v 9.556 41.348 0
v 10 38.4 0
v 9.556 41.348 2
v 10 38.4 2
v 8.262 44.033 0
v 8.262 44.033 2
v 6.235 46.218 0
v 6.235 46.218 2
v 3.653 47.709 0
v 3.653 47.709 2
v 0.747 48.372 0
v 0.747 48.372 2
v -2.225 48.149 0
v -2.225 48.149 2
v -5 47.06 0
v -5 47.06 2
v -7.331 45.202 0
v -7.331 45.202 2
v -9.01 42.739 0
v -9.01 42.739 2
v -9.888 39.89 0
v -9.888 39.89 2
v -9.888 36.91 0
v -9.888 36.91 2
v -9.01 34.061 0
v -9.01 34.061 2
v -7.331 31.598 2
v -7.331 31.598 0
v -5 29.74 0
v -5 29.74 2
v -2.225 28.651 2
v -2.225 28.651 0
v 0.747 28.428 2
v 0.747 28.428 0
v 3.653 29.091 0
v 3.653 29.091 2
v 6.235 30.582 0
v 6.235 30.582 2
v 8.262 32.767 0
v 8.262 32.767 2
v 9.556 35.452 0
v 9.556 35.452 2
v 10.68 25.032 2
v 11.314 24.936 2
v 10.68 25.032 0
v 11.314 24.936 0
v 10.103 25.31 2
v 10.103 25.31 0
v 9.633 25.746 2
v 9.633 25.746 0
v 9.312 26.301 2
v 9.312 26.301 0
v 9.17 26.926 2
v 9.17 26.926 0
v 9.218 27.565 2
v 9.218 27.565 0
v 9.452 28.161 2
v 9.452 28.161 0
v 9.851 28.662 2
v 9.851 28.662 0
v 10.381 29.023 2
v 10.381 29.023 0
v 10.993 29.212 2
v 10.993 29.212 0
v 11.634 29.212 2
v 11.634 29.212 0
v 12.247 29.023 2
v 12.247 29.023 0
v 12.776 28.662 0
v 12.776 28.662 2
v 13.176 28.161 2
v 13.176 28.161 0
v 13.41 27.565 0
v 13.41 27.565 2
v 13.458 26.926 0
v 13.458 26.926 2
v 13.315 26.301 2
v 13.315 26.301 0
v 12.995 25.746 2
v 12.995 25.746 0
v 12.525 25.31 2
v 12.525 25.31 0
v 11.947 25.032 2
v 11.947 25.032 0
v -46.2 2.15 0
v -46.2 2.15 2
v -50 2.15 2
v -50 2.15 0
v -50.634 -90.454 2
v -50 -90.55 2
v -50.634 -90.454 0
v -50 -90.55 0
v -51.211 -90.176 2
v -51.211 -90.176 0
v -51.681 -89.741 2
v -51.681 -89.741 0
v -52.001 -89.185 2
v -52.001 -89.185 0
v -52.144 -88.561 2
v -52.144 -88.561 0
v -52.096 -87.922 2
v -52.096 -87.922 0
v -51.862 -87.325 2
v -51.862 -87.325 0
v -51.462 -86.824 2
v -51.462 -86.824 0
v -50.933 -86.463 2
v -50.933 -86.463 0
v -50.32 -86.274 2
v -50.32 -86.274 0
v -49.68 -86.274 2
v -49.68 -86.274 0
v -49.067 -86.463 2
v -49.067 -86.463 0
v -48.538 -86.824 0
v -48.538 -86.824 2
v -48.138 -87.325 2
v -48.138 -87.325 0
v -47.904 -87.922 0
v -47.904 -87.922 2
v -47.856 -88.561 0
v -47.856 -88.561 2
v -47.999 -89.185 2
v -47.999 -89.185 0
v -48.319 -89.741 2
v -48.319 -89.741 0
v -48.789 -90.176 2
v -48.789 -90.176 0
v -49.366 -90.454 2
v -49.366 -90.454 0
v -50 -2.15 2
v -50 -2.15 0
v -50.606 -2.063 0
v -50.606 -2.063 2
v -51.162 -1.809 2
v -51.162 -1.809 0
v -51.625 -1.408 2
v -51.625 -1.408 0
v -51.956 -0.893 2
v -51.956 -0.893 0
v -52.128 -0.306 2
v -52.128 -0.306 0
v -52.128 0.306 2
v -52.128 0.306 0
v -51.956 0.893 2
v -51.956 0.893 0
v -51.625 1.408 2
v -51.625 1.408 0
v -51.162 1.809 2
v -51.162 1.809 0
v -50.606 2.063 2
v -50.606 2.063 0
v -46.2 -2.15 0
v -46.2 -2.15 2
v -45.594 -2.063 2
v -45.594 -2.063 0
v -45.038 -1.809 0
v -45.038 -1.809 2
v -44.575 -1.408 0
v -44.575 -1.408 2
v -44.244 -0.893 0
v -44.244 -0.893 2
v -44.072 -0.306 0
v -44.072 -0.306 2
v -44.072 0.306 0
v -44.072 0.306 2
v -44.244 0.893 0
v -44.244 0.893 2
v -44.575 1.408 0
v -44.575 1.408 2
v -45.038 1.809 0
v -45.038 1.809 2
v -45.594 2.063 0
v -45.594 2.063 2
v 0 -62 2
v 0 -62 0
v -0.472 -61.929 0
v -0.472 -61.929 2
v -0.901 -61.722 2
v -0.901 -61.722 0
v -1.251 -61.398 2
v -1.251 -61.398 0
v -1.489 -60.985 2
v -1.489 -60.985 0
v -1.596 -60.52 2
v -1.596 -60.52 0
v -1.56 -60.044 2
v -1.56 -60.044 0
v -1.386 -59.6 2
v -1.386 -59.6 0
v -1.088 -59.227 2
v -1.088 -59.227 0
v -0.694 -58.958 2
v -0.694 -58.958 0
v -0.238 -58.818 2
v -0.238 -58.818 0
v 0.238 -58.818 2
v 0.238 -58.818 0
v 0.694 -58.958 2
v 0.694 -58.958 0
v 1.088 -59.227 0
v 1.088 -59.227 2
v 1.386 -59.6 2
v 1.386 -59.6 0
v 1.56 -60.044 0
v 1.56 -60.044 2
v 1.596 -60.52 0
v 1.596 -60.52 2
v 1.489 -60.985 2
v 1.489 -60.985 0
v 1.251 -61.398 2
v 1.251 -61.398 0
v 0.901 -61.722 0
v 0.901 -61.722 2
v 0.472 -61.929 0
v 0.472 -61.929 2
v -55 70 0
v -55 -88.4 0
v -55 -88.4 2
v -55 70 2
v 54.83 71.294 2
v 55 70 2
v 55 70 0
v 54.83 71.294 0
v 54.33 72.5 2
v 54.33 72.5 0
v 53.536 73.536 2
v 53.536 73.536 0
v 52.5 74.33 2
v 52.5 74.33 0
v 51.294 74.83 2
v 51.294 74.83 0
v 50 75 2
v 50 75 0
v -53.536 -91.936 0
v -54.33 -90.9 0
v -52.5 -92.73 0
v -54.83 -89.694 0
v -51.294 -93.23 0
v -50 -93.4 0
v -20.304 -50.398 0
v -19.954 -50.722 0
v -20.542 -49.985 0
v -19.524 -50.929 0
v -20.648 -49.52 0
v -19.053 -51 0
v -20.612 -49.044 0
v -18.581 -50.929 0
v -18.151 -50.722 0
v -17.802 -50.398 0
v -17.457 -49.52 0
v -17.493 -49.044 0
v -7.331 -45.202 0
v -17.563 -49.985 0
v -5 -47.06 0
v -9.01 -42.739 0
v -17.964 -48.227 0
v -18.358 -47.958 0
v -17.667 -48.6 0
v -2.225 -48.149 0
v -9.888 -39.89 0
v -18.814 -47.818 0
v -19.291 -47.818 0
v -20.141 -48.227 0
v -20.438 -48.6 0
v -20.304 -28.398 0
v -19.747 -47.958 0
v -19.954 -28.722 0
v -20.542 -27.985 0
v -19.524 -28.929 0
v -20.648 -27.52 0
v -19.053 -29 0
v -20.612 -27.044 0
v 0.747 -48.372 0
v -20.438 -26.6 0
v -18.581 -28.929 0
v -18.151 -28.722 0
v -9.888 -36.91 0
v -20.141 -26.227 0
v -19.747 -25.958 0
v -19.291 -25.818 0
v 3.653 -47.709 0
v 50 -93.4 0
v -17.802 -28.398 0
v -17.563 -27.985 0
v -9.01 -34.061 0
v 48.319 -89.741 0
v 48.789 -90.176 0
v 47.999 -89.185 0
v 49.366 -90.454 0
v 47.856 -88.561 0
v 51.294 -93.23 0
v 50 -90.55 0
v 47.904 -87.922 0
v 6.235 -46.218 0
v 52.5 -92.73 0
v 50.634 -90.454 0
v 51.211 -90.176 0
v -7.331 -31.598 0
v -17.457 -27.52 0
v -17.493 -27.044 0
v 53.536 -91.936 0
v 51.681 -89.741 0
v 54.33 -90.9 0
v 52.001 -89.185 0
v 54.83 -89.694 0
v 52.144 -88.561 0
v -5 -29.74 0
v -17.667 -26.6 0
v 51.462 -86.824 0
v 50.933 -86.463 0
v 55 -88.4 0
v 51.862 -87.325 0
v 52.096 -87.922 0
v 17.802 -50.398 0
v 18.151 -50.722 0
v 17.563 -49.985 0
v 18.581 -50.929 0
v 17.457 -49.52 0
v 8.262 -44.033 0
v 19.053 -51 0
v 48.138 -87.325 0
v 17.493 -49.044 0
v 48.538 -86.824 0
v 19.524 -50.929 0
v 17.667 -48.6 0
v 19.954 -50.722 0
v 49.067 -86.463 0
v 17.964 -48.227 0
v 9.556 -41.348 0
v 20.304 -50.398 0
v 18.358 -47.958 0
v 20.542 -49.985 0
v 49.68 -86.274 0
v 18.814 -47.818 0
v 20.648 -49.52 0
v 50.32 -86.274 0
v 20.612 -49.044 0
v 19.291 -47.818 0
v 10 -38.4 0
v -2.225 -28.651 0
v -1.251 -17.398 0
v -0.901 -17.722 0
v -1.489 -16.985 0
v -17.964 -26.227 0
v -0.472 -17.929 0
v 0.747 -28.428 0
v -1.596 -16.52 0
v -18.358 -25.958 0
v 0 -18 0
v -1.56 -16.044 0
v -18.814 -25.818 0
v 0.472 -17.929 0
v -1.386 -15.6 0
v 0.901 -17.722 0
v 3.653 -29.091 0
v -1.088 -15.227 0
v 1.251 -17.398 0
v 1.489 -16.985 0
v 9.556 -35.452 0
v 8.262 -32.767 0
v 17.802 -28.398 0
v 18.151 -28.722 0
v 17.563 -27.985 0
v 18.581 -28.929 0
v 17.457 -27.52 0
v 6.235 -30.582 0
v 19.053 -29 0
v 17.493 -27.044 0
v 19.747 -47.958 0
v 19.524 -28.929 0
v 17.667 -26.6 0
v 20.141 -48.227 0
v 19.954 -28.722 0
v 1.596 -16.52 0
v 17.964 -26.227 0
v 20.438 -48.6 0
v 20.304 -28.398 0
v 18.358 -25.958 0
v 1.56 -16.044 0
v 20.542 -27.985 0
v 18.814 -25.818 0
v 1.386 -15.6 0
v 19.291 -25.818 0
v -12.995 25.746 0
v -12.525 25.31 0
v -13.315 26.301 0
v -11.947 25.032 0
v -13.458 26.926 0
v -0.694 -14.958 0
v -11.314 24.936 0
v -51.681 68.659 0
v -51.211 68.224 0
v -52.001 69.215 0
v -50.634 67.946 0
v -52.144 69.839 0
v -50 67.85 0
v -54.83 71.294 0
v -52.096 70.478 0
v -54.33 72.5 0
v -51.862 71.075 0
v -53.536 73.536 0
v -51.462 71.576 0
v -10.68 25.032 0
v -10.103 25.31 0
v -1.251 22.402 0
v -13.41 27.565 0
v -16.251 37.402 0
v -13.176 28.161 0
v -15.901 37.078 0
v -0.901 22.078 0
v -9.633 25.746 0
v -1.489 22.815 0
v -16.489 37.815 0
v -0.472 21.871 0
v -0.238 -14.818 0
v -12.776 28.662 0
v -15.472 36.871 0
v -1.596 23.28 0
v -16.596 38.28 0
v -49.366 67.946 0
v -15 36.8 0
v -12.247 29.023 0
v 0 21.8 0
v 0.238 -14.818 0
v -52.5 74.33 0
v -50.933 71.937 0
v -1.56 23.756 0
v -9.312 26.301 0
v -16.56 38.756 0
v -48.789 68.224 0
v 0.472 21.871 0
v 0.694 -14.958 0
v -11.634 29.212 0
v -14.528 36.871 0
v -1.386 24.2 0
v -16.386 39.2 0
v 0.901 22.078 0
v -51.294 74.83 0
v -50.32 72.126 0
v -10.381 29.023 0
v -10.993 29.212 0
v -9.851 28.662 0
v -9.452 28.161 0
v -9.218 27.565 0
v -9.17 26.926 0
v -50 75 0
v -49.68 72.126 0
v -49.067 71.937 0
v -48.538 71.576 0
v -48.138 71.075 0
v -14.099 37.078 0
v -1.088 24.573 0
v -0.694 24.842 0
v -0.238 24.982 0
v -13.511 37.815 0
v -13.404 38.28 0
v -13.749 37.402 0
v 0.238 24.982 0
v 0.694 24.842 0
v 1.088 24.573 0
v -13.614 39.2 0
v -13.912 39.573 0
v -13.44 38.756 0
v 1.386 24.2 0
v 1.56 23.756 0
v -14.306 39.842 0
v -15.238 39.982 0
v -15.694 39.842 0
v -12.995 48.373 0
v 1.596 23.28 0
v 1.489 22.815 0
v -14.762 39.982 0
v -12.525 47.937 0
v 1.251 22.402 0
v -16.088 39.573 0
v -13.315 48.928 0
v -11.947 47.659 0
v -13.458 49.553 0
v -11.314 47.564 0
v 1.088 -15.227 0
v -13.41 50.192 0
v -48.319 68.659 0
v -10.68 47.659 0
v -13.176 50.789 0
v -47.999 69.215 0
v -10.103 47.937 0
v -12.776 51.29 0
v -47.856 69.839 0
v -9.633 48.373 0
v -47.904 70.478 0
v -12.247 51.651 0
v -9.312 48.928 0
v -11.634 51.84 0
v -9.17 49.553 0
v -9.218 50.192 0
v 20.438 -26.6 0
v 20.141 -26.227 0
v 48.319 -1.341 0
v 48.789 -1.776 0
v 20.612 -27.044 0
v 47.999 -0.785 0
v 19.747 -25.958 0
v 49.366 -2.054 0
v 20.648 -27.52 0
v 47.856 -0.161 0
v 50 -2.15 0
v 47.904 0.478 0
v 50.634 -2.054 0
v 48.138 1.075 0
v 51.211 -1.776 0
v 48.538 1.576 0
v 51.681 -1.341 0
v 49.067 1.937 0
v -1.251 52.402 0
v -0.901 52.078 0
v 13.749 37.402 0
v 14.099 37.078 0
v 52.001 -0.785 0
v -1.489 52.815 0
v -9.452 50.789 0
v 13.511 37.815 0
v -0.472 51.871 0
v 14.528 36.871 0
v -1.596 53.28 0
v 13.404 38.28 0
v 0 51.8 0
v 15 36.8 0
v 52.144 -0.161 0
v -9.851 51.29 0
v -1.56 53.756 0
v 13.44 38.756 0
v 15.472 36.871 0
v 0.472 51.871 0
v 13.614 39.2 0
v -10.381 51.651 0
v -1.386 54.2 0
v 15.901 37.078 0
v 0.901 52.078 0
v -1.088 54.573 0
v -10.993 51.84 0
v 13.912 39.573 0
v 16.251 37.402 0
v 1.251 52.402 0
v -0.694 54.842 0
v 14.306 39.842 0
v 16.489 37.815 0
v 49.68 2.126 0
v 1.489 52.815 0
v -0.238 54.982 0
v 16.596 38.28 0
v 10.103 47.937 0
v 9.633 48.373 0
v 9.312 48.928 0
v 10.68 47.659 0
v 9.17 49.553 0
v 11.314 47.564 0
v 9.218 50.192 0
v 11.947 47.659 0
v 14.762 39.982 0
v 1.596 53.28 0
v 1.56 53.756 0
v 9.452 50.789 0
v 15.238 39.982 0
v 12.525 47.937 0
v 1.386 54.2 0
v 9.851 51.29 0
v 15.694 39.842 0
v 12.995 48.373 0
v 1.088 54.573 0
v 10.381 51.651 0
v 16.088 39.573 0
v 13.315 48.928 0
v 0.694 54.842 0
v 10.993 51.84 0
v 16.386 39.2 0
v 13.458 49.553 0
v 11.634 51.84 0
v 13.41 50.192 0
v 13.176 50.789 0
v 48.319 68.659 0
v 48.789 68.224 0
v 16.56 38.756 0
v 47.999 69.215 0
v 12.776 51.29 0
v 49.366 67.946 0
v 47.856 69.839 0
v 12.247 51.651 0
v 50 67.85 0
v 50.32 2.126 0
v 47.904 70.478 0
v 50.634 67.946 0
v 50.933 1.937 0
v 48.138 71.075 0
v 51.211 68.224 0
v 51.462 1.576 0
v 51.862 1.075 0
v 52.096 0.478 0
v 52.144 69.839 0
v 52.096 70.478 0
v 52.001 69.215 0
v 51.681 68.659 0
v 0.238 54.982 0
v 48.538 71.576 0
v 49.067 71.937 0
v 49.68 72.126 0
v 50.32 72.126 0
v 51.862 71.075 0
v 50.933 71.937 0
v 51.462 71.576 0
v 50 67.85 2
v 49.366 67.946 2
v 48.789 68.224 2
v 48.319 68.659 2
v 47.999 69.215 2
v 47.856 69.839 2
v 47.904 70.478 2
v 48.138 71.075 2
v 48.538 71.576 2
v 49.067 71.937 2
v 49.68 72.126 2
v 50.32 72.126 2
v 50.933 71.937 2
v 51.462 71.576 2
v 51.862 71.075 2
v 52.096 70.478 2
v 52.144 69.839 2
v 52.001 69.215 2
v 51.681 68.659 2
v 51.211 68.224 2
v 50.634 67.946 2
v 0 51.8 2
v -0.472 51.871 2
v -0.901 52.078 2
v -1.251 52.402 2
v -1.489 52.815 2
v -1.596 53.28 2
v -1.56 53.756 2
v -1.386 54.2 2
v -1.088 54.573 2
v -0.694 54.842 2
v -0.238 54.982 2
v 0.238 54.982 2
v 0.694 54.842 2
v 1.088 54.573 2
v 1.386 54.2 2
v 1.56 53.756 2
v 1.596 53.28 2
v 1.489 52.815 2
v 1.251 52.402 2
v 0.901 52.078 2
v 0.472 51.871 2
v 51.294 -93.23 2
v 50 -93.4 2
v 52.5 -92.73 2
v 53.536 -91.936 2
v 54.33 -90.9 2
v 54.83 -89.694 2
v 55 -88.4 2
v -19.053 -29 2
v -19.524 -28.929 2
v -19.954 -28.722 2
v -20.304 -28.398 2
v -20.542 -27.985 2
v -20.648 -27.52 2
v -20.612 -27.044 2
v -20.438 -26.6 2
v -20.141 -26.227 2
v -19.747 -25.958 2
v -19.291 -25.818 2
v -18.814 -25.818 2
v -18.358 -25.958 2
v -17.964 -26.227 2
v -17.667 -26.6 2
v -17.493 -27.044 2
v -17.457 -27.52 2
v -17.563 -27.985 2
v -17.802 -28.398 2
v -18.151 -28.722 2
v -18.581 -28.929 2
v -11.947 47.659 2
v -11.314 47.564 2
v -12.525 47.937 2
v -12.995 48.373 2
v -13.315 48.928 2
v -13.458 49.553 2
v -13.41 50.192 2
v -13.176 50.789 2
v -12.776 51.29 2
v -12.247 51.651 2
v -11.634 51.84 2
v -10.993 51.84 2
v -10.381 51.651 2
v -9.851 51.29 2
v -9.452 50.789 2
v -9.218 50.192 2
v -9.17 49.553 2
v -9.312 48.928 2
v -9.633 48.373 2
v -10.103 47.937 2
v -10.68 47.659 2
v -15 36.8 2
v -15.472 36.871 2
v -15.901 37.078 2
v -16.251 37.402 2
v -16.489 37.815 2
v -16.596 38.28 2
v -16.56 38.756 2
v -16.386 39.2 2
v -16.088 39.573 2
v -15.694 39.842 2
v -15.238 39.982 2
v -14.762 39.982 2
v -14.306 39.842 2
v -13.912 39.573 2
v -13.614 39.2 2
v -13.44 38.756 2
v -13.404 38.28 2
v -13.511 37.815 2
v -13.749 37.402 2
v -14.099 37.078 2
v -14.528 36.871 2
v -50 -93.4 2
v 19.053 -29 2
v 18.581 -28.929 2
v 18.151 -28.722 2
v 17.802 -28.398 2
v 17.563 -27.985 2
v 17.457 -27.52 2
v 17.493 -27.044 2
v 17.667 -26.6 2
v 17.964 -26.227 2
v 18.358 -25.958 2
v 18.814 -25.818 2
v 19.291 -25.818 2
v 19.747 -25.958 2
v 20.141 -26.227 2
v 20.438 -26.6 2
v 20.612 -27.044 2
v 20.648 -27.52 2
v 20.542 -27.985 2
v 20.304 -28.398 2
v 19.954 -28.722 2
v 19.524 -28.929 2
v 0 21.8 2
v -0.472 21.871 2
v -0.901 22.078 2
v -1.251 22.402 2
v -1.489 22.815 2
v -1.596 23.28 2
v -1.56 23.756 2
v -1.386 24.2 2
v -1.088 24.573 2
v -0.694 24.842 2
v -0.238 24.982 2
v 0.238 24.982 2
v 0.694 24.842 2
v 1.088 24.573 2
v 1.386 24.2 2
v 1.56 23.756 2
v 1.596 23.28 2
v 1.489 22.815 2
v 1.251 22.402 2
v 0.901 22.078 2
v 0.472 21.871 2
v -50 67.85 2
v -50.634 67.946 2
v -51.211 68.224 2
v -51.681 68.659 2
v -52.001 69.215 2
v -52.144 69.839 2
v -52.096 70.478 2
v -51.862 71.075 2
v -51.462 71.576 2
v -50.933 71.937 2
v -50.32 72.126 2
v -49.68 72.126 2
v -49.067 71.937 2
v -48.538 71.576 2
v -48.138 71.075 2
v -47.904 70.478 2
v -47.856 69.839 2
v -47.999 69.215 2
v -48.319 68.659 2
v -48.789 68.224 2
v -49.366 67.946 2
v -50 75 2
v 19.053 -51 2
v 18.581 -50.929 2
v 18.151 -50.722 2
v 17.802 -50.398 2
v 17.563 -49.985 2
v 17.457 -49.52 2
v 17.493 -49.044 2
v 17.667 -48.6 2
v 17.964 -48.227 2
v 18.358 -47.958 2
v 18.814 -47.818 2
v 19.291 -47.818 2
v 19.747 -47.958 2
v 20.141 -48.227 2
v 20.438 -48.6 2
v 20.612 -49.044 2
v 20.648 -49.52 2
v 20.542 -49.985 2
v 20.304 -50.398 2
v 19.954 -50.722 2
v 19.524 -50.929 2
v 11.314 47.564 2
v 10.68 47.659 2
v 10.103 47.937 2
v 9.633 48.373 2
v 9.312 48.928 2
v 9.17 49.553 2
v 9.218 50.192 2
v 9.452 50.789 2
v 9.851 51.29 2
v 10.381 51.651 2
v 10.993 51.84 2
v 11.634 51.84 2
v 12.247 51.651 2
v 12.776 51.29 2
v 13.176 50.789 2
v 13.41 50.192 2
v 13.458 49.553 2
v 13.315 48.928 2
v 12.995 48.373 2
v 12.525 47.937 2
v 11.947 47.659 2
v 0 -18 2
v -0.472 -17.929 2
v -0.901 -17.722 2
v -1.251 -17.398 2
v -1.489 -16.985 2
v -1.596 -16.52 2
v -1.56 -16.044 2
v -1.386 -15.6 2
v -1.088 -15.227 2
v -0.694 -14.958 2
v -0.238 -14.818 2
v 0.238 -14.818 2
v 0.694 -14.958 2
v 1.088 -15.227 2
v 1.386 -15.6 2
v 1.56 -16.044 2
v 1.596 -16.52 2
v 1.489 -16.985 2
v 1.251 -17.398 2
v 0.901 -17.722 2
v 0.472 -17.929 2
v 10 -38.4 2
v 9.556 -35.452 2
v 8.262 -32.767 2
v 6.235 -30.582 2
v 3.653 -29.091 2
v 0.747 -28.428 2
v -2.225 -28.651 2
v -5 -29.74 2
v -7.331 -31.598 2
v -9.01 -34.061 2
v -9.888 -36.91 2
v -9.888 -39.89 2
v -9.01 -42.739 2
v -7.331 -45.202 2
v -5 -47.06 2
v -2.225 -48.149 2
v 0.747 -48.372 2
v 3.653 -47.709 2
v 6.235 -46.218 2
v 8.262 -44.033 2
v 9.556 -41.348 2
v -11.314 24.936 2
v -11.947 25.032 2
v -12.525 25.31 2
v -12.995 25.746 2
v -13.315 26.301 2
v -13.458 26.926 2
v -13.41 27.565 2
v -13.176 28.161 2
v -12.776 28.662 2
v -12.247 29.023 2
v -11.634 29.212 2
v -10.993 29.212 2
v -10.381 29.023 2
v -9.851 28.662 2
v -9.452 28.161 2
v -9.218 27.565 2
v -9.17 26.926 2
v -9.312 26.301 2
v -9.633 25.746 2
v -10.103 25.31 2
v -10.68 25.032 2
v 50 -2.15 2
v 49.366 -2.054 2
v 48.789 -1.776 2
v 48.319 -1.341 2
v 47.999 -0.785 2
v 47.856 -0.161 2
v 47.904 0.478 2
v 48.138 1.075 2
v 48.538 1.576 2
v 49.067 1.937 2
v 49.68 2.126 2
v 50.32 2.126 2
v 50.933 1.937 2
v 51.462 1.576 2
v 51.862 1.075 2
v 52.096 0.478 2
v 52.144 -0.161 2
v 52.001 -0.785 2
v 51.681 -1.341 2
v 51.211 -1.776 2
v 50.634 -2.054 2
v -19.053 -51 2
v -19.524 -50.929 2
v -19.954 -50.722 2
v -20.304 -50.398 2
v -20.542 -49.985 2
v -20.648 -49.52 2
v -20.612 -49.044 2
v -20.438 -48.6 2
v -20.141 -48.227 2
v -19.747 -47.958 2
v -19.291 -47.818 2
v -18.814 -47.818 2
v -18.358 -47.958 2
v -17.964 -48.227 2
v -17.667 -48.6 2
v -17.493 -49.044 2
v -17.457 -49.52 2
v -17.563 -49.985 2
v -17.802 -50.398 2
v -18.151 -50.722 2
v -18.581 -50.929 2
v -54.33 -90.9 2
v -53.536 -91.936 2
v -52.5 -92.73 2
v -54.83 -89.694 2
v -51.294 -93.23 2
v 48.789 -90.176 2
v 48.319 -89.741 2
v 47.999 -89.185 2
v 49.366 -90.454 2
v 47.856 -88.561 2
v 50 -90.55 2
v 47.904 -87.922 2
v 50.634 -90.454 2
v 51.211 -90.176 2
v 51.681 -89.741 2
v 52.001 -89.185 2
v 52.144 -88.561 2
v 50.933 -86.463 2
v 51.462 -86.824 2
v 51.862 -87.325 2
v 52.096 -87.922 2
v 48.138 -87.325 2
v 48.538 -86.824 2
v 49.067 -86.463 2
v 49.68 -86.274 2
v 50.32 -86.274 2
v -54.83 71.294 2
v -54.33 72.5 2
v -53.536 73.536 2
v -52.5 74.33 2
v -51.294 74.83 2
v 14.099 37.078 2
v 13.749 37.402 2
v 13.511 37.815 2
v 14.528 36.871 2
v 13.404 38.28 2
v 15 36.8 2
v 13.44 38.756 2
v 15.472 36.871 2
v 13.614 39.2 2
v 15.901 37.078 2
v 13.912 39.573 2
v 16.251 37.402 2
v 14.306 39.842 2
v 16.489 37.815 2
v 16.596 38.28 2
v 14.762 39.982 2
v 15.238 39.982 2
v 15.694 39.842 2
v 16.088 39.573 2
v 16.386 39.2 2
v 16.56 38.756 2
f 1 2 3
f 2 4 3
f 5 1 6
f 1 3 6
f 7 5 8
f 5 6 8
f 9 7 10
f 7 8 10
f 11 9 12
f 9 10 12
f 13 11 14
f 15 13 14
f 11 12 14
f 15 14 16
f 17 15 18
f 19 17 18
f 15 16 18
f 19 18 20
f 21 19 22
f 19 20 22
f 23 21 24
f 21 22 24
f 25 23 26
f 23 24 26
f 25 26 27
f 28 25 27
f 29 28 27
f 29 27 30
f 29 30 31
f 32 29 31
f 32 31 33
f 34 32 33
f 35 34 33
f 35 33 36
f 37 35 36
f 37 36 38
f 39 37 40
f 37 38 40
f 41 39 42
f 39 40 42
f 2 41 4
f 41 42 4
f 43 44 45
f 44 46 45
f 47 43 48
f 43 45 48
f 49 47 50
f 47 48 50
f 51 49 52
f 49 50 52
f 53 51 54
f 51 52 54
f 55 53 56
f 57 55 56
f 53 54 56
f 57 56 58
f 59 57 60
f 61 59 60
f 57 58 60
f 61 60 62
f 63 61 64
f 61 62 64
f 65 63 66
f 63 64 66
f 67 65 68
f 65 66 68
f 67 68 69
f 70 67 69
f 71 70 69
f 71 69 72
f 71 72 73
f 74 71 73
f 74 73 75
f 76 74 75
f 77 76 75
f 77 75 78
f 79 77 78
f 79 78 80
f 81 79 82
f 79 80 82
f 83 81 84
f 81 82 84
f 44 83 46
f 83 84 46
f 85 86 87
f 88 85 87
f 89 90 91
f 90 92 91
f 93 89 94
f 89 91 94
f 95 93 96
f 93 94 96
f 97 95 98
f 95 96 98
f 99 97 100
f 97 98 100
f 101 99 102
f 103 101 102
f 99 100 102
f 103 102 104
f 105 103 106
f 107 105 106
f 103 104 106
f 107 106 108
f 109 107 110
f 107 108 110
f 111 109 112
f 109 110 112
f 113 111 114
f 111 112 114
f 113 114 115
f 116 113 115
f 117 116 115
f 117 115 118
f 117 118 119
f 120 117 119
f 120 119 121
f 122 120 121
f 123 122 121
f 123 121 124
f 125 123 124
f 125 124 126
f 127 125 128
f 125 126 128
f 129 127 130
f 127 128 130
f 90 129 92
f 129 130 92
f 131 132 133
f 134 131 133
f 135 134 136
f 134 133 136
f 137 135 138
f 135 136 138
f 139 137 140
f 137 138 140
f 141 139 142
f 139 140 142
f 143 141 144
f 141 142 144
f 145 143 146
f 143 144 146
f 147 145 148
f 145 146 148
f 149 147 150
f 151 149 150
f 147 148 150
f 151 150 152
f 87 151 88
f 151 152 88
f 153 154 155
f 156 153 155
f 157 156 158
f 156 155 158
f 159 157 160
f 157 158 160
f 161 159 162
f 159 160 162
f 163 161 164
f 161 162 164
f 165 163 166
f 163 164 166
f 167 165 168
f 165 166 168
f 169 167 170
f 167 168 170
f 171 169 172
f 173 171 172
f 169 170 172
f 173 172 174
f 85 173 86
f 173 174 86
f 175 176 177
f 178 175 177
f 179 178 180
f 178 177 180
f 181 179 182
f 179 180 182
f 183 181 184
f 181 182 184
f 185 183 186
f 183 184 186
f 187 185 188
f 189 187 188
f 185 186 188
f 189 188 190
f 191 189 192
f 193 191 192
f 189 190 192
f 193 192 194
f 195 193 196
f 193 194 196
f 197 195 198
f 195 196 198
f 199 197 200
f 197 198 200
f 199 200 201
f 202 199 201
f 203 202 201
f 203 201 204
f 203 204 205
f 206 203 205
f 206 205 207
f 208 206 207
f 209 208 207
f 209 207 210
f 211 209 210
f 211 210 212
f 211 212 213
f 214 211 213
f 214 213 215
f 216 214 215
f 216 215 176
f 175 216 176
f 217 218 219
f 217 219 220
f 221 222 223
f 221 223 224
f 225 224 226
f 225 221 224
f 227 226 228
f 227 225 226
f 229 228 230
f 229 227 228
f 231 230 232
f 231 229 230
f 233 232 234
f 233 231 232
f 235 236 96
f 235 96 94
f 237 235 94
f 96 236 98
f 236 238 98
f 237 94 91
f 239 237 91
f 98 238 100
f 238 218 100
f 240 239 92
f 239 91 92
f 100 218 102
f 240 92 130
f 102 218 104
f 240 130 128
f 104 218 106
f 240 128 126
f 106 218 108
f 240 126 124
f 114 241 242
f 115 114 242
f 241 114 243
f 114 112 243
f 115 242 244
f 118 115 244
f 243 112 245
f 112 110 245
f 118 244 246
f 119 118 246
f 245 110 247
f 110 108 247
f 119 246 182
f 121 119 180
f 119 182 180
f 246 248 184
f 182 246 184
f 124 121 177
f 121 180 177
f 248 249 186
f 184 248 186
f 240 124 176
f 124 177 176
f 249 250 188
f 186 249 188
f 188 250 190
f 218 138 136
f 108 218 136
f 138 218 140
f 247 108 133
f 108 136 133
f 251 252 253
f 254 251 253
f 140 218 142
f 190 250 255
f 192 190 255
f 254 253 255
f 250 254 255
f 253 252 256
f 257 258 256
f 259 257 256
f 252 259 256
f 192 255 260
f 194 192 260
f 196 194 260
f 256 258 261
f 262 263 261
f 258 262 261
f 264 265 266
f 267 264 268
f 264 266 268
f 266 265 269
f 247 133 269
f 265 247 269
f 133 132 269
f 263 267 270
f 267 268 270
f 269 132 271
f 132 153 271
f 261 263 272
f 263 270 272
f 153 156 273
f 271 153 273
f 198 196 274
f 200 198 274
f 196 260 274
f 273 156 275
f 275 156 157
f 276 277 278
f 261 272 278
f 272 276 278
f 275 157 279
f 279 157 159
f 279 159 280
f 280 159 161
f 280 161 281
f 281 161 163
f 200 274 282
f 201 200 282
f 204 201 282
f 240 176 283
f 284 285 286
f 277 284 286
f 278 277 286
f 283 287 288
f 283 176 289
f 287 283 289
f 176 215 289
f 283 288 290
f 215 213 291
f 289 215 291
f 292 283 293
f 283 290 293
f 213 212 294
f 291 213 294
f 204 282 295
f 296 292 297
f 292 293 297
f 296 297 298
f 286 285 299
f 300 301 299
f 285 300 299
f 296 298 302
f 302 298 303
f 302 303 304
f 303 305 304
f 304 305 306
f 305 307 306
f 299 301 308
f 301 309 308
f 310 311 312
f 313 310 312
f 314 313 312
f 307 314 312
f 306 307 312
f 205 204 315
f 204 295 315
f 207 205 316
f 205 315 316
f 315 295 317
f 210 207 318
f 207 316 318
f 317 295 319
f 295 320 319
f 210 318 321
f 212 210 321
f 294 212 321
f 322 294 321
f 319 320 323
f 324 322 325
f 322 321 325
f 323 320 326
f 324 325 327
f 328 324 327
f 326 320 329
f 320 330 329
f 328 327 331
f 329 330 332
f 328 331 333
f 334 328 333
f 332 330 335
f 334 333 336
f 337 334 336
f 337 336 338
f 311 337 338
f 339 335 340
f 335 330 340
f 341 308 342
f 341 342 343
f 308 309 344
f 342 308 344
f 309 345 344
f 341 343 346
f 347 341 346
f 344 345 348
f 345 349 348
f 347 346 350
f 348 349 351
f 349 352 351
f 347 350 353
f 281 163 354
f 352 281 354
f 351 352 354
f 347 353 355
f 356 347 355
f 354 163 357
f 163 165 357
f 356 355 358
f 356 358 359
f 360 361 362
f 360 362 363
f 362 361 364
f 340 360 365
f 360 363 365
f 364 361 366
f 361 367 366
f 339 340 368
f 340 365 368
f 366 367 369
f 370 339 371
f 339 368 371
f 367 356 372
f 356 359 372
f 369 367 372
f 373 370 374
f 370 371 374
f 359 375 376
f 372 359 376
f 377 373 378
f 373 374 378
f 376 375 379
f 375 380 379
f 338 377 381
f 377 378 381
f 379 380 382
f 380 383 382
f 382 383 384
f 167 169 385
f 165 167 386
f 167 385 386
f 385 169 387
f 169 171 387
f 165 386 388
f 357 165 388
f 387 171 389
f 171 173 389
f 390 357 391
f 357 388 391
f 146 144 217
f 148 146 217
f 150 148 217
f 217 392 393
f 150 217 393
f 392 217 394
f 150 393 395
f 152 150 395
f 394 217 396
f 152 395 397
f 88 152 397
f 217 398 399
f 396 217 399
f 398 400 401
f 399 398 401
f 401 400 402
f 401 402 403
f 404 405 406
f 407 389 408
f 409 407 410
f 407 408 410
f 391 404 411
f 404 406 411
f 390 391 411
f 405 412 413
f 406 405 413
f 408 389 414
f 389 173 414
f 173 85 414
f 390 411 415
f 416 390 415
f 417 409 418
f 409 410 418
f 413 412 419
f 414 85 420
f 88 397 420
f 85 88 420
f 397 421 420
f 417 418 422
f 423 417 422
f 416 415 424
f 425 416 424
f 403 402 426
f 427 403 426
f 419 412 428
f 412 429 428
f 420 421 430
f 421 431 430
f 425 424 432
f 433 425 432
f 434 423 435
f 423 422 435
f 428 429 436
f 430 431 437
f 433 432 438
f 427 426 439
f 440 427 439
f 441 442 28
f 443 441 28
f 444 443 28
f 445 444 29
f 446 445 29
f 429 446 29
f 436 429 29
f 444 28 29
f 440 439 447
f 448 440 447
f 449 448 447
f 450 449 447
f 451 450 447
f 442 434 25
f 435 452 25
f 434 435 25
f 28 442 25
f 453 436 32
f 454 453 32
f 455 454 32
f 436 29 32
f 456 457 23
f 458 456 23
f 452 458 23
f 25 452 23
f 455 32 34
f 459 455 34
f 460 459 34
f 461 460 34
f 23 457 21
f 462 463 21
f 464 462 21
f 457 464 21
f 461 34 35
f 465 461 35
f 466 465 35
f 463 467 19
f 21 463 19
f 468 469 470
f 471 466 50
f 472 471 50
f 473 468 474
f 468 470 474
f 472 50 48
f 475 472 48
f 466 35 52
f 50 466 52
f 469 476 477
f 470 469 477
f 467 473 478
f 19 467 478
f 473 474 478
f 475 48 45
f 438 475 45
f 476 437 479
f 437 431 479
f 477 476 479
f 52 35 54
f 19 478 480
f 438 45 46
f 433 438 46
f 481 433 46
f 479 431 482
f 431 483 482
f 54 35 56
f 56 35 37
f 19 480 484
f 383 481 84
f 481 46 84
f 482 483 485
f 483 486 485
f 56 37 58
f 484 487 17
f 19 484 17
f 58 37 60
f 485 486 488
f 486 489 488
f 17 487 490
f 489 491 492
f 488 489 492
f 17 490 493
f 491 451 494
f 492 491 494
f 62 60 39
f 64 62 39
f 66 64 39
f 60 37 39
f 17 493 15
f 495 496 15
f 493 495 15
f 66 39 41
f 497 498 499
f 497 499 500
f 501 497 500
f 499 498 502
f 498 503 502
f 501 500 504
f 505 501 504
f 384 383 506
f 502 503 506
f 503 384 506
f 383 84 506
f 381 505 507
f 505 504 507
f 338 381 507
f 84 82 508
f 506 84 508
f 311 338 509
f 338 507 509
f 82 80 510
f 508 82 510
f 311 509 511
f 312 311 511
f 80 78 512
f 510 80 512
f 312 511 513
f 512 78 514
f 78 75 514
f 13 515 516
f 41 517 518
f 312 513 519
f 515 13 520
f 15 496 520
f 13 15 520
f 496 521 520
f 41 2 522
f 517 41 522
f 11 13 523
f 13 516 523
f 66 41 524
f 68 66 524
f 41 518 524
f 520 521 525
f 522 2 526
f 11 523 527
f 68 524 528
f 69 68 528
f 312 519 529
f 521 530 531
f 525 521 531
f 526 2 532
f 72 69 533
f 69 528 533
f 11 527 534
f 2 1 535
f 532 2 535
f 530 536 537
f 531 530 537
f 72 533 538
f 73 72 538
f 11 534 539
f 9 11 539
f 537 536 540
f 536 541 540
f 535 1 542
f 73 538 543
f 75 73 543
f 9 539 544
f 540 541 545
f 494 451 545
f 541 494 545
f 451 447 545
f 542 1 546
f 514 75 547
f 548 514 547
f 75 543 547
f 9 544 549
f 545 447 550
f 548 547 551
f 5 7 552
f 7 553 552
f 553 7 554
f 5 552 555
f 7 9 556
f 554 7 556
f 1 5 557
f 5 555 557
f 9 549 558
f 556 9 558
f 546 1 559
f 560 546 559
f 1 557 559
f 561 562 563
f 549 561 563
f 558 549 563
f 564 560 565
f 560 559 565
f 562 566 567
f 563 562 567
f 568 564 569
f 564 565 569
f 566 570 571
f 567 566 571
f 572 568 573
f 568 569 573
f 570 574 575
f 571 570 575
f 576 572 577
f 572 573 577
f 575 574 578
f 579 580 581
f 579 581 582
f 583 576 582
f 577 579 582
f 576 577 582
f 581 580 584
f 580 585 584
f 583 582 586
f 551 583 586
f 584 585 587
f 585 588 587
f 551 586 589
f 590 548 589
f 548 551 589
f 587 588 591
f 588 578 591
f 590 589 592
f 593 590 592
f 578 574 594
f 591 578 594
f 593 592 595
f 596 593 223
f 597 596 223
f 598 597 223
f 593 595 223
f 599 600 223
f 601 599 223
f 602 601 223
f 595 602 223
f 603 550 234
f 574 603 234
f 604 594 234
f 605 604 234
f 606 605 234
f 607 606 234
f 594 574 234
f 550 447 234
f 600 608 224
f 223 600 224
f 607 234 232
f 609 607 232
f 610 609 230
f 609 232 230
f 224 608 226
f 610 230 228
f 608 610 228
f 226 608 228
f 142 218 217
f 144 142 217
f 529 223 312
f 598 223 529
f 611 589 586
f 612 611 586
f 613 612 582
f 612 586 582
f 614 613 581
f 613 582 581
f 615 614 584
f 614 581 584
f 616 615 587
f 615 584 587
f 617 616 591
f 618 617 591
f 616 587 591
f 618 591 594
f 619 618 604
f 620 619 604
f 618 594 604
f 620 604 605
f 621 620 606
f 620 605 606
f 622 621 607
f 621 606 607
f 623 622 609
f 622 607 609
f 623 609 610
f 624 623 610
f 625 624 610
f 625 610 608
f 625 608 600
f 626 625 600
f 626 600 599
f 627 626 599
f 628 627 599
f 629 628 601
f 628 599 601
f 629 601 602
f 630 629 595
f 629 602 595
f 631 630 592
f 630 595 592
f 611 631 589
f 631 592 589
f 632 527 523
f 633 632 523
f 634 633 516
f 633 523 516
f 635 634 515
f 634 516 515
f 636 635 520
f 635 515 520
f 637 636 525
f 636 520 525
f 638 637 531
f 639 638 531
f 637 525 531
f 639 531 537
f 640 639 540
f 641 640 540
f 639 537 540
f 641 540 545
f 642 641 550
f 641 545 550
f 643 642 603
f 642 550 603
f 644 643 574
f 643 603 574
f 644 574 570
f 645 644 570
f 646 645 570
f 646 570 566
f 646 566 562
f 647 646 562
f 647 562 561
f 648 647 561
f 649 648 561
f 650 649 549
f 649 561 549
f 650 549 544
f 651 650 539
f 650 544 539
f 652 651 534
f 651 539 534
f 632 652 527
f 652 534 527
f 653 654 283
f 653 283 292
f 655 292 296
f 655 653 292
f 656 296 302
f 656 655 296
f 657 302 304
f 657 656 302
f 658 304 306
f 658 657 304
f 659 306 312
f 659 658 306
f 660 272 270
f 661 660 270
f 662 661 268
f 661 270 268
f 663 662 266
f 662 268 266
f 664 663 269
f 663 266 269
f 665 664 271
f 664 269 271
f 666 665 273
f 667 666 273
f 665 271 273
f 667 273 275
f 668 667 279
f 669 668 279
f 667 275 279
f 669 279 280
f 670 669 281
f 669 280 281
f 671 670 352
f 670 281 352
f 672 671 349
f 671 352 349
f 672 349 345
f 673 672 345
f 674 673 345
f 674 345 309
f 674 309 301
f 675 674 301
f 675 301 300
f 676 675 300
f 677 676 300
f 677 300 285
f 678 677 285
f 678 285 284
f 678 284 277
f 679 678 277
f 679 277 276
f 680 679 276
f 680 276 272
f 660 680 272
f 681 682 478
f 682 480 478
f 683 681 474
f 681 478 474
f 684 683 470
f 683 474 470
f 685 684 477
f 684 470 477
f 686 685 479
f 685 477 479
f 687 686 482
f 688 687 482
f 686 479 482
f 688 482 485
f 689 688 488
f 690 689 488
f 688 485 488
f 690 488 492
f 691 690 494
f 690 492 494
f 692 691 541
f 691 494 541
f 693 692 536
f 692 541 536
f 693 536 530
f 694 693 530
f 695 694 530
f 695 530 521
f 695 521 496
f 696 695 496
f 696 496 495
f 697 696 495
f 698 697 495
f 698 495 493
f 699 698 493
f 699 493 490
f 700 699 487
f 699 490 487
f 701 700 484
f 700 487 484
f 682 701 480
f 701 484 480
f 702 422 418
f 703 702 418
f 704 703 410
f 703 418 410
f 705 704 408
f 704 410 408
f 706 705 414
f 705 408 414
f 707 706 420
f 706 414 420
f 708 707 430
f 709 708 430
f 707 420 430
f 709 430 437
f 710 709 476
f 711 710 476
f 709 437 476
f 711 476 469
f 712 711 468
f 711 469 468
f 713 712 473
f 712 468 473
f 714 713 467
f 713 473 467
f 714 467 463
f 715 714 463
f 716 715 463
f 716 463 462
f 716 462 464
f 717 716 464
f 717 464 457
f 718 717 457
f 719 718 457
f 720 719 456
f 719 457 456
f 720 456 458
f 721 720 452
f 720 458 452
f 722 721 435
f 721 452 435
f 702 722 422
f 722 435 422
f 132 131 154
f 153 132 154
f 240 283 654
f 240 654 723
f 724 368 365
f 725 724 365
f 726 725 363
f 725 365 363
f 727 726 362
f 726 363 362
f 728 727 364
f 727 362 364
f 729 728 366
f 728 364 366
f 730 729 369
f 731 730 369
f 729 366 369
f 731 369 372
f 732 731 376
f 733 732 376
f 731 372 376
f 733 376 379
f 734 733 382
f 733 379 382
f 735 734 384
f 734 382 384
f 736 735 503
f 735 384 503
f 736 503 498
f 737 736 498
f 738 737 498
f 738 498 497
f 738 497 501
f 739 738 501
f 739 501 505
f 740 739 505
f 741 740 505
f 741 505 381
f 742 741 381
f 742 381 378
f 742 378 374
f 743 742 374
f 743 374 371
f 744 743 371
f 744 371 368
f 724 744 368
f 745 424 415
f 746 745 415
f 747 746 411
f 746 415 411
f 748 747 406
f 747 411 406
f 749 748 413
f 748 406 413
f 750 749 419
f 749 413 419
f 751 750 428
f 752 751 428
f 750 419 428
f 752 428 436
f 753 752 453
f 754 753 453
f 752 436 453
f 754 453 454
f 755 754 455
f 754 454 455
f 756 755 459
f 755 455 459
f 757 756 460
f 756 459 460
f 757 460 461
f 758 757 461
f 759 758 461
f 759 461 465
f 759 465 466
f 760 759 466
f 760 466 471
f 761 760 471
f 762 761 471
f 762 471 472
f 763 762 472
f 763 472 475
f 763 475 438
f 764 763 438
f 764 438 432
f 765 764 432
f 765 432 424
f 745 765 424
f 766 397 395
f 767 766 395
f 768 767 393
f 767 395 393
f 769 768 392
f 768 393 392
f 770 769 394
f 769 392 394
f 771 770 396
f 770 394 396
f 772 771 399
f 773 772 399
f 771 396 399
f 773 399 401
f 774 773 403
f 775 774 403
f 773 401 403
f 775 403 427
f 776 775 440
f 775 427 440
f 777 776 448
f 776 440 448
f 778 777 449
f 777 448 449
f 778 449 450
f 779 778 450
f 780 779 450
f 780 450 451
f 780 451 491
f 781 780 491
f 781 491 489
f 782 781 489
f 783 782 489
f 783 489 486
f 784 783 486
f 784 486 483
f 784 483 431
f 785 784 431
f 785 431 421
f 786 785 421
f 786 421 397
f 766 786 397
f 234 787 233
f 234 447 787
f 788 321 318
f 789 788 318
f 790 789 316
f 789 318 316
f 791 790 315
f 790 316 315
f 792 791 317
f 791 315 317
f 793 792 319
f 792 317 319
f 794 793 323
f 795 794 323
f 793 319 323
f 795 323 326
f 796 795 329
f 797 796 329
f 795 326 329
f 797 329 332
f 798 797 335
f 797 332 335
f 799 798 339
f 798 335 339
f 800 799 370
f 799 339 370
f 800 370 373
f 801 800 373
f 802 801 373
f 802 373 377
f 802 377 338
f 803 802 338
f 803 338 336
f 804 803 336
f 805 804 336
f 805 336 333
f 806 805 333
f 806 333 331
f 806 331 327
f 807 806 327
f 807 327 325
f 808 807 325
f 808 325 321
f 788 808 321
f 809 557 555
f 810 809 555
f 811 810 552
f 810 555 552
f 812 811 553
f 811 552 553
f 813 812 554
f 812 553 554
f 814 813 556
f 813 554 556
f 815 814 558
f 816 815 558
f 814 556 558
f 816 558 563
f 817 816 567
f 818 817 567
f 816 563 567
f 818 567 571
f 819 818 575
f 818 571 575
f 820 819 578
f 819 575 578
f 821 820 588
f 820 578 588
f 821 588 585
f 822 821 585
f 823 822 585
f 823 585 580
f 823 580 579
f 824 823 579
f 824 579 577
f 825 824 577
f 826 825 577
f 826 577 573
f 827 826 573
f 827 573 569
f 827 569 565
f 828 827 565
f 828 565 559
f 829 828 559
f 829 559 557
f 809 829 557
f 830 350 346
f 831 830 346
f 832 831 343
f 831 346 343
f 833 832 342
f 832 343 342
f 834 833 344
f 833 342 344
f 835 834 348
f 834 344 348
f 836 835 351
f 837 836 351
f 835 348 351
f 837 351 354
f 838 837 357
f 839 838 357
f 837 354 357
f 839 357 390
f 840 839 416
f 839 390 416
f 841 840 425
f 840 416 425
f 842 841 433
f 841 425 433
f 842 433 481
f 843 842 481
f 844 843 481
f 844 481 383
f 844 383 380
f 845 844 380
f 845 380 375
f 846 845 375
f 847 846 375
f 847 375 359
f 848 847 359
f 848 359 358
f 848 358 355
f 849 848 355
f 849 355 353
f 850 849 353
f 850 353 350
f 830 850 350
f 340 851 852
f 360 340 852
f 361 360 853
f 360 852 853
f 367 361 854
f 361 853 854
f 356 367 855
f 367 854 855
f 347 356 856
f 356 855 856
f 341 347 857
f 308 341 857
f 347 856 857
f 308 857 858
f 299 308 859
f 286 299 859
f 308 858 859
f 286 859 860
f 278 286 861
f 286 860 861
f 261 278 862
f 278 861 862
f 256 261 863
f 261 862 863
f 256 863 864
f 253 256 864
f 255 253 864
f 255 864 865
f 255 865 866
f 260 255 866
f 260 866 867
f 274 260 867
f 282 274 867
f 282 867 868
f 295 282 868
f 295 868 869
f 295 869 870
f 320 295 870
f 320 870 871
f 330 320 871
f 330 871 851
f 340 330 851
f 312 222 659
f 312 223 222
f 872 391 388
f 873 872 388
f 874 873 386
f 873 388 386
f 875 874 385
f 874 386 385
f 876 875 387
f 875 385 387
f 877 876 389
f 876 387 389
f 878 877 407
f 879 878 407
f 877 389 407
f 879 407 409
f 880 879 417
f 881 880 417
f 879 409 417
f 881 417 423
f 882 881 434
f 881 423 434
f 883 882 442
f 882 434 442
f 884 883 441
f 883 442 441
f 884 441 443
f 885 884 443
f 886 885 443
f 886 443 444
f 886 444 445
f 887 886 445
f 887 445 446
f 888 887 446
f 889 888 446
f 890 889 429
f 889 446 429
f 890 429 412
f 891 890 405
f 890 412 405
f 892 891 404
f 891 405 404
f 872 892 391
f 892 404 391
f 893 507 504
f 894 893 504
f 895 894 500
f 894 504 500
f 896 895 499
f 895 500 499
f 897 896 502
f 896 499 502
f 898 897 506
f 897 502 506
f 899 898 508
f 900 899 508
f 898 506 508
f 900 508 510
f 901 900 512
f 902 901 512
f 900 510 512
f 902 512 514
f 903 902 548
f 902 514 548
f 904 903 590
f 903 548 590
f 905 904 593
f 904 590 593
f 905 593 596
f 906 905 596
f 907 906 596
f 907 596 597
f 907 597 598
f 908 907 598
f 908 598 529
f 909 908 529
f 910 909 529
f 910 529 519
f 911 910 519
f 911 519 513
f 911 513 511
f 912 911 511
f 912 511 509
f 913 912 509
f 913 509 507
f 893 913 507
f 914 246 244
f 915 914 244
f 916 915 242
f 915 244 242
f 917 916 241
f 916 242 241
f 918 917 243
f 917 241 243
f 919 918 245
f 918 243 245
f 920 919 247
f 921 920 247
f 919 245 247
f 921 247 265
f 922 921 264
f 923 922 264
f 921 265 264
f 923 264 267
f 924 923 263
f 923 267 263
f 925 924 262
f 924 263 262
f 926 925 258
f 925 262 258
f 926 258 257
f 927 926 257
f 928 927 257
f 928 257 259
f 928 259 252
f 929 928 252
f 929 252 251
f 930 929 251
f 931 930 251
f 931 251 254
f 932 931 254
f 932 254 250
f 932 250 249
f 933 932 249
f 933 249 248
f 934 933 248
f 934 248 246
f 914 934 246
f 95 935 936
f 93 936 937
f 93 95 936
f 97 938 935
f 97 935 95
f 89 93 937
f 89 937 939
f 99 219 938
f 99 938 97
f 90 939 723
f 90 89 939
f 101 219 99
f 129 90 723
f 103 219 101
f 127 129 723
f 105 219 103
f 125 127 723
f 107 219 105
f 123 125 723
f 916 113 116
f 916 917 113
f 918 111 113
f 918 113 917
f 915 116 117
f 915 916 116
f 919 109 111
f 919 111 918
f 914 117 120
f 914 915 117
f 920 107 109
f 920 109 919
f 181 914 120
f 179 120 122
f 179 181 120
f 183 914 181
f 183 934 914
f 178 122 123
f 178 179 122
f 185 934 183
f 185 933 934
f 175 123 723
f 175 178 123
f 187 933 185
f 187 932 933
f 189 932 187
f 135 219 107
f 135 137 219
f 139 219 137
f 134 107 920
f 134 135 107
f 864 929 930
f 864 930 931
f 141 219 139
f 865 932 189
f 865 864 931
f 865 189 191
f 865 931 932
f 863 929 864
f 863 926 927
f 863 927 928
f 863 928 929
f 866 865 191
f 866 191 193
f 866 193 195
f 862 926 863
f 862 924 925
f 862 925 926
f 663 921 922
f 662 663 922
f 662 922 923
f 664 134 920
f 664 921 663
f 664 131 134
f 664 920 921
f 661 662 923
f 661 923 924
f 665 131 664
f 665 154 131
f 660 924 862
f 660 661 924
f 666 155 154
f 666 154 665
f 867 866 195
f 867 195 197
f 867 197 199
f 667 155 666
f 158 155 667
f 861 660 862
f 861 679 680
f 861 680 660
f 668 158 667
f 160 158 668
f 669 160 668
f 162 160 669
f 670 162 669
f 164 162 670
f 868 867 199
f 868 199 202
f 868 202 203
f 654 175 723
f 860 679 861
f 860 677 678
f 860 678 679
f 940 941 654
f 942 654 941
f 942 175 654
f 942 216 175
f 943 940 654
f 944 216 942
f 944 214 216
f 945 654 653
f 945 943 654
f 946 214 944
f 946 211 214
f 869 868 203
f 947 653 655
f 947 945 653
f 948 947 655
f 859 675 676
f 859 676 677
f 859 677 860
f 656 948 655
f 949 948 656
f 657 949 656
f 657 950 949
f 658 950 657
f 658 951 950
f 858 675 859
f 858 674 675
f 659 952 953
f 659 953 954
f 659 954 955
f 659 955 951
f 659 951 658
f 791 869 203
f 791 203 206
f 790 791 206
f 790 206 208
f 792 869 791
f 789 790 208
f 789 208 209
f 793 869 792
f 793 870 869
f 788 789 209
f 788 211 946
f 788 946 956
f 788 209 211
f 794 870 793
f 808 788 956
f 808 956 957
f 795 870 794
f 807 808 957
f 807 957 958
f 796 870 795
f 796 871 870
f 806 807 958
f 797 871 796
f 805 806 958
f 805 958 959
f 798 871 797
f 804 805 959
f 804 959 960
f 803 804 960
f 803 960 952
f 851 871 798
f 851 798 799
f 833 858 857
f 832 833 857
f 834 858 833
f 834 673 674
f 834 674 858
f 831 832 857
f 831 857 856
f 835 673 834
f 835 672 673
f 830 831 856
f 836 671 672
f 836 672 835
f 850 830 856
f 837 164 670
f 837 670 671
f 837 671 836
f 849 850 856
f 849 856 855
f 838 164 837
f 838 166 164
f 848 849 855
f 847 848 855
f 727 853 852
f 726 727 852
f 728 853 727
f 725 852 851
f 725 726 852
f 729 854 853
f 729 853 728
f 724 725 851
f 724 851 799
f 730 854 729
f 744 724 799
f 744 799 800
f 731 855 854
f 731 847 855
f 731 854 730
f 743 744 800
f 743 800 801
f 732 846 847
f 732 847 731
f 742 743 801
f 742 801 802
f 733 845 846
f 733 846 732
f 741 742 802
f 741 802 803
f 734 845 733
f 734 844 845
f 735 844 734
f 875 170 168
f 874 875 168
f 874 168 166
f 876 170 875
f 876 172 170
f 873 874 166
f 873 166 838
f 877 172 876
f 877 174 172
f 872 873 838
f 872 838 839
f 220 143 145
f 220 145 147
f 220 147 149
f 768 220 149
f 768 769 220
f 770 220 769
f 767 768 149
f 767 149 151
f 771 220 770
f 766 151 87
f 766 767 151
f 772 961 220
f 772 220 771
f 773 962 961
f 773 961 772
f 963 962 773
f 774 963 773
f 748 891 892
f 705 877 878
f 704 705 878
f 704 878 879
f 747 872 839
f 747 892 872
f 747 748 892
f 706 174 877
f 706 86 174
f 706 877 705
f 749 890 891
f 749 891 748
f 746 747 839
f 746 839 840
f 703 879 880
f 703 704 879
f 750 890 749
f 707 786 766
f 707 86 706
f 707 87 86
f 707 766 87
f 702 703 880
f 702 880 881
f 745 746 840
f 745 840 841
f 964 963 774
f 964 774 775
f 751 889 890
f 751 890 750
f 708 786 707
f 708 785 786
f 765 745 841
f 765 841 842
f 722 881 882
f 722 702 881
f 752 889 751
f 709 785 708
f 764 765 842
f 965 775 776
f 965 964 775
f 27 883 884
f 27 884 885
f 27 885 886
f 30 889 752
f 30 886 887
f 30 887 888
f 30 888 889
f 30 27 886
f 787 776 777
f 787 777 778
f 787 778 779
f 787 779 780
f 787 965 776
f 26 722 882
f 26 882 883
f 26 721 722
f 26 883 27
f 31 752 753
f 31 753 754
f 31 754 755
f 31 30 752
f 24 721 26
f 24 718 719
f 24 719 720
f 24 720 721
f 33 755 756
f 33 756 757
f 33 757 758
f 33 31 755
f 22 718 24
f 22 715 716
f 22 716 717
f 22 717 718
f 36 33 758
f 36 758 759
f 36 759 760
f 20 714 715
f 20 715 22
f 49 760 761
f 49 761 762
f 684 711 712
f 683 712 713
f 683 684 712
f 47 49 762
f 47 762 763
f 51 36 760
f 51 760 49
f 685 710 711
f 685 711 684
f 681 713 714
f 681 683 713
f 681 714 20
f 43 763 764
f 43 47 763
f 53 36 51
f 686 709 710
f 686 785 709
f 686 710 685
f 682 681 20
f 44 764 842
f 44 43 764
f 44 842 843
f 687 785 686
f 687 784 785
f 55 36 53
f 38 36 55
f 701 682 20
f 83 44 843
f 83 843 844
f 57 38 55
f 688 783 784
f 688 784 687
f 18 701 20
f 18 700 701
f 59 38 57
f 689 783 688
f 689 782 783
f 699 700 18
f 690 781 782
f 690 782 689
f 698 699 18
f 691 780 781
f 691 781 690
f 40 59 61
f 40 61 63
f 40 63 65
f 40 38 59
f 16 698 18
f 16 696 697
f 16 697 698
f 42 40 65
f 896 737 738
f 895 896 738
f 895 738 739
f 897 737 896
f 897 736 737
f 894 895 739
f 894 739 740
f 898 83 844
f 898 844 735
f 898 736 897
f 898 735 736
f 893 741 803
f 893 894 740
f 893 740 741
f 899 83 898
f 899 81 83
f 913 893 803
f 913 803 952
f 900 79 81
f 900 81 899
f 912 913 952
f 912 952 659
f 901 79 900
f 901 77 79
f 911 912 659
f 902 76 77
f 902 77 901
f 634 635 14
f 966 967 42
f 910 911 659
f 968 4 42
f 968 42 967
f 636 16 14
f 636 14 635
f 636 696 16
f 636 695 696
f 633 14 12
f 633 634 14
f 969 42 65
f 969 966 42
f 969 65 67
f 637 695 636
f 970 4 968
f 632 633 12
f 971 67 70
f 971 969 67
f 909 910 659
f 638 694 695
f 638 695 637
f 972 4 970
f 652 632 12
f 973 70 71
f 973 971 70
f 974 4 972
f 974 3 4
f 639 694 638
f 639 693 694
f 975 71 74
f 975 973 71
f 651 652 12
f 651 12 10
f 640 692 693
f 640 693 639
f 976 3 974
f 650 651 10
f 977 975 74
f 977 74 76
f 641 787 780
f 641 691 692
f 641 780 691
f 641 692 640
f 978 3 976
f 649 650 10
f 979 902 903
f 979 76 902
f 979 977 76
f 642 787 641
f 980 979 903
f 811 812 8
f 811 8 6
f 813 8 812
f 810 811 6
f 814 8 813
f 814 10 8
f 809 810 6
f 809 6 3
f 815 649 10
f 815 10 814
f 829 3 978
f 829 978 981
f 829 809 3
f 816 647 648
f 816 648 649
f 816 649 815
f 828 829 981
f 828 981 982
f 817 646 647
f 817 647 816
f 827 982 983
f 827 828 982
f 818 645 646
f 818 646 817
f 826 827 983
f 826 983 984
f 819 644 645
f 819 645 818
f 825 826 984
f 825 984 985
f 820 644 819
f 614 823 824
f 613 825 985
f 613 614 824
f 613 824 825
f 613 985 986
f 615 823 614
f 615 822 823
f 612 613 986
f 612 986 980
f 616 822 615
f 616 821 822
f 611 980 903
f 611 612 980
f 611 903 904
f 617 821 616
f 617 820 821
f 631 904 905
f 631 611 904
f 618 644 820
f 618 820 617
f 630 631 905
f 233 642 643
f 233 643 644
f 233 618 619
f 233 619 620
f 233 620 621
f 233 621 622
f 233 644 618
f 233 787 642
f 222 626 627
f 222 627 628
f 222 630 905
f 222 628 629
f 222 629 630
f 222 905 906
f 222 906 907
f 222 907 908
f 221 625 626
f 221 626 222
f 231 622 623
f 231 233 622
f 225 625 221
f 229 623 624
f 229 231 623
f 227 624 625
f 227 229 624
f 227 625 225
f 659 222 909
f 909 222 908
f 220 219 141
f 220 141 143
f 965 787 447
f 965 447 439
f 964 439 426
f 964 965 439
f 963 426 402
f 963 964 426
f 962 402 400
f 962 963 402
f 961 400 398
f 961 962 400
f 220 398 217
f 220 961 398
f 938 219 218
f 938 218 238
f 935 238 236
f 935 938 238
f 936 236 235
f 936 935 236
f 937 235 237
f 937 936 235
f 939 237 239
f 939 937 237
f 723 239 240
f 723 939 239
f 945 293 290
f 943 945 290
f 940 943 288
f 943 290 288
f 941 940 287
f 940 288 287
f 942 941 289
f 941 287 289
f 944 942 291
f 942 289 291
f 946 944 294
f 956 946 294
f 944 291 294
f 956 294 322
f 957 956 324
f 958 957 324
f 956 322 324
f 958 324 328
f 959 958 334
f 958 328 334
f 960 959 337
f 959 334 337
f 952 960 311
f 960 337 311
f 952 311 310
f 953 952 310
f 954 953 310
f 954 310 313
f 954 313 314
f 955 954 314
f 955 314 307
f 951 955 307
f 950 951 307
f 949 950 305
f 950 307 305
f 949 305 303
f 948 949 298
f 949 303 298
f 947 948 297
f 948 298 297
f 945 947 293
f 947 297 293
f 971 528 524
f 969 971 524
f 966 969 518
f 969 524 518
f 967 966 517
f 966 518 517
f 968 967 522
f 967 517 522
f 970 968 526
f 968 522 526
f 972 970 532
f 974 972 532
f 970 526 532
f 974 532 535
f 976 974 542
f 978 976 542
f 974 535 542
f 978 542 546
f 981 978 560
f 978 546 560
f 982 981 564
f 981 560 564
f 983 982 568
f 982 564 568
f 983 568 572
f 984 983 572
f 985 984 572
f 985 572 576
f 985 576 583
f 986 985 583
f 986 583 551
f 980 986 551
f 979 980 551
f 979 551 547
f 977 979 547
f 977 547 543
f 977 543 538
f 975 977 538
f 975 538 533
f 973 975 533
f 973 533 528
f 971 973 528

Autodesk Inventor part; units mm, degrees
ref_plane "YZ Plane" through (0, 0, 0) normal (1, 0, 0) x (0, 1, 0)
ref_plane "XZ Plane" through (0, 0, 0) normal (0, 1, 0) x (-1, 0, 0)
ref_plane "XY Plane" through (0, 0, 0) normal (0, 0, 1) x (1, 0, 0)
sketch "スケッチ1" plane through (0, 0, 0) normal (0, 0, 1) x (1, 0, 0)
  line L0 (55, -93.4) -> (-55, -93.4)
  line L1 (-55, -93.4) -> (-55, 75)
  line L2 (-55, 75) -> (55, 75)
  line L3 (55, 75) -> (55, -93.4)
  line L4 (55, -93.4) -> (-55, 75) construction
  line L5 (-55, -93.4) -> (55, 75) construction
  point P0 (0, 0)
  point P1 (0, -9.2)
  point P2 (0, -9.2)
  dimension "d50" = 93.4
  dimension "d51" = 110
  dimension "d52" = 75
extrude "プレート1" add sketch "スケッチ1" along normal blind 2
sketch "スケッチ3" plane through (0, 0, 2) normal (0, 0, 1) x (1, 0, 0)
  circle A0 centre (0, 38.4) radius 10
  circle A1 centre (0, -38.4) radius 10
  point P0 (0, 0)
  dimension "d22" = 20
  dimension "d53" = 20
  dimension "d55" = 76.8
  dimension "d56" = 38.4
extrude "押し出し1" cut sketch "スケッチ3" against normal blind 10 contours A0
sketch "スケッチ2" plane through (0, 0, 2) normal (0, 0, 1) x (1, 0, 0)
  circle A0 centre (0, 38.4) radius 15 construction
  circle A1 centre (0, -38.4) radius 22
  point P0 (0, 0)
  point P1 (0, 53.4)
  point P2 (-15, 38.4)
  point P3 (0, 23.4)
  point P4 (15, 38.4)
  point P5 (0, -16.4)
  point P6 (-19.0526, -27.4)
  point P7 (-19.0526, -49.4)
  point P8 (0, -60.4)
  point P9 (19.0526, -49.4)
  point P10 (19.0526, -27.4)
  dimension "d3" = 30
  dimension "d8" = 44
  dimension "d6" = 360
  dimension "d11" = 360
  dimension "d13" = 76.8
  dimension "d14" = 38.4
hole "穴1" at (0, 53.4, 2) at (-15, 38.4, 2) at (0, 23.4, 2) at (15, 38.4, 2) at (0, -16.4, 2) at (-19.0526, -27.4, 2) at (-19.0526, -49.4, 2) at (0, -60.4, 2) at (19.0526, -27.4, 2) at (19.0526, -49.4, 2) direction (0, 0, -1) diameter 3.2 end through all clearance for "Socket Head Cap Screw" size "M3" standard "Ansi Metric M Profile"
sketch "スケッチ4" plane through (0, 0, 2) normal (0, 0, 1) x (1, 0, 0)
  line L0 (55, -93.4) -> (-55, -93.4) projected
  line L1 (-55, -93.4) -> (-55, 75) projected
  line L2 (55, 75) -> (55, -93.4) projected
  line L3 (-55, 75) -> (55, 75) projected
  line L4 (-50, 70) -> (-50, -88.4)
  line L5 (-50, -88.4) -> (50, -88.4)
  line L6 (50, -88.4) -> (50, 70)
  line L7 (50, 70) -> (-50, 70)
  point P0 (-50, 0)
  point P1 (50, 0)
  point P2 (0, 0)
  dimension "d57" = 5
hole "穴2" at (-50, -88.4, 2) at (50, -88.4, 2) at (50, 70, 2) at (-50, 70, 2) at (-50, 0, 2) at (50, 0, 2) direction (0, 0, -1) diameter 4.3 end through all clearance for "Socket Head Cap Screw" size "M4" standard "Ansi Metric M Profile"
fillet "コーナーR1" radius 5 4 edges at (-55, -93.4, 1) (55, -93.4, 1) (55, 75, 1) (-55, 75, 1)
sketch "スケッチ5" plane through (0, 0, 2) normal (0, 0, 1) x (1, 0, 0)
  circle A0 centre (0, -38.4) radius 10
  point P0 (0, 0)
  dimension "d35" = 20
extrude "押し出し2" cut sketch "スケッチ5" against normal blind 10
sketch "スケッチ6" plane through (0, 0, 2) normal (0, 0, 1) x (1, 0, 0)
  circle A0 centre (0, 38.4) radius 10 projected
  circle A1 centre (0, 38.4) radius 16
  point P0 (0, 0)
  point P1 (-11.3137, 49.7137)
  point P2 (-11.3137, 27.0863)
  point P3 (11.3137, 27.0863)
  point P4 (11.3137, 49.7137)
  dimension "d38" = 32
  dimension "d41" = 360
hole "穴3" at (-11.3137, 49.7137, 2) at (-11.3137, 27.0863, 2) at (11.3137, 27.0863, 2) at (11.3137, 49.7137, 2) direction (0, 0, -1) diameter 4.3 end through all clearance for "Socket Head Cap Screw" size "M4" standard "Ansi Metric M Profile"
sketch "スケッチ7" plane through (0, 0, 2) normal (0, 0, 1) x (1, 0, 0)
  line L0 (-46.2, 0) -> (-50, 0) construction
  line L1 (-46.2, 2.15) -> (-50, 2.15)
  line L2 (-50, -2.15) -> (-46.2, -2.15)
  arc A0 (-46.2, -2.15) -> (-46.2, 2.15) centre (-46.2, 0) ccw
  arc A1 (-50, 2.15) -> (-50, -2.15) centre (-50, 0) ccw
  circle A2 centre (-50, 0) radius 2.15 projected
  point P0 (0, 0)
  point P1 (-48.1, 0)
  dimension "d58" = 48.1
extrude "押し出し3" cut sketch "スケッチ7" against normal blind 10
equation "\"d56\" = 0.5 * d55"
equation "\"d14\" = 0.5 * d13"
equation "\"d20\" = Thickness"
equation "\"d2\" = Thickness"
equation "\"BendRadius\" = Thickness"
equation "\"BendReliefWidth\" = Thickness"
equation "\"BendReliefDepth\" = 0.5 * Thickness"
equation "\"CornerReliefSize\" = 4 * Thickness"
equation "\"MinimumRemnant\" = 2 * Thickness"
equation "\"TransitionRadius\" = BendRadius"
equation "\"JacobiRadiusSize\" = BendRadius"
equation "\"GapSize\" = Thickness"
equation "\"Thickness\" = 2"
properties part number "carbonplate1" material "CFRP"
